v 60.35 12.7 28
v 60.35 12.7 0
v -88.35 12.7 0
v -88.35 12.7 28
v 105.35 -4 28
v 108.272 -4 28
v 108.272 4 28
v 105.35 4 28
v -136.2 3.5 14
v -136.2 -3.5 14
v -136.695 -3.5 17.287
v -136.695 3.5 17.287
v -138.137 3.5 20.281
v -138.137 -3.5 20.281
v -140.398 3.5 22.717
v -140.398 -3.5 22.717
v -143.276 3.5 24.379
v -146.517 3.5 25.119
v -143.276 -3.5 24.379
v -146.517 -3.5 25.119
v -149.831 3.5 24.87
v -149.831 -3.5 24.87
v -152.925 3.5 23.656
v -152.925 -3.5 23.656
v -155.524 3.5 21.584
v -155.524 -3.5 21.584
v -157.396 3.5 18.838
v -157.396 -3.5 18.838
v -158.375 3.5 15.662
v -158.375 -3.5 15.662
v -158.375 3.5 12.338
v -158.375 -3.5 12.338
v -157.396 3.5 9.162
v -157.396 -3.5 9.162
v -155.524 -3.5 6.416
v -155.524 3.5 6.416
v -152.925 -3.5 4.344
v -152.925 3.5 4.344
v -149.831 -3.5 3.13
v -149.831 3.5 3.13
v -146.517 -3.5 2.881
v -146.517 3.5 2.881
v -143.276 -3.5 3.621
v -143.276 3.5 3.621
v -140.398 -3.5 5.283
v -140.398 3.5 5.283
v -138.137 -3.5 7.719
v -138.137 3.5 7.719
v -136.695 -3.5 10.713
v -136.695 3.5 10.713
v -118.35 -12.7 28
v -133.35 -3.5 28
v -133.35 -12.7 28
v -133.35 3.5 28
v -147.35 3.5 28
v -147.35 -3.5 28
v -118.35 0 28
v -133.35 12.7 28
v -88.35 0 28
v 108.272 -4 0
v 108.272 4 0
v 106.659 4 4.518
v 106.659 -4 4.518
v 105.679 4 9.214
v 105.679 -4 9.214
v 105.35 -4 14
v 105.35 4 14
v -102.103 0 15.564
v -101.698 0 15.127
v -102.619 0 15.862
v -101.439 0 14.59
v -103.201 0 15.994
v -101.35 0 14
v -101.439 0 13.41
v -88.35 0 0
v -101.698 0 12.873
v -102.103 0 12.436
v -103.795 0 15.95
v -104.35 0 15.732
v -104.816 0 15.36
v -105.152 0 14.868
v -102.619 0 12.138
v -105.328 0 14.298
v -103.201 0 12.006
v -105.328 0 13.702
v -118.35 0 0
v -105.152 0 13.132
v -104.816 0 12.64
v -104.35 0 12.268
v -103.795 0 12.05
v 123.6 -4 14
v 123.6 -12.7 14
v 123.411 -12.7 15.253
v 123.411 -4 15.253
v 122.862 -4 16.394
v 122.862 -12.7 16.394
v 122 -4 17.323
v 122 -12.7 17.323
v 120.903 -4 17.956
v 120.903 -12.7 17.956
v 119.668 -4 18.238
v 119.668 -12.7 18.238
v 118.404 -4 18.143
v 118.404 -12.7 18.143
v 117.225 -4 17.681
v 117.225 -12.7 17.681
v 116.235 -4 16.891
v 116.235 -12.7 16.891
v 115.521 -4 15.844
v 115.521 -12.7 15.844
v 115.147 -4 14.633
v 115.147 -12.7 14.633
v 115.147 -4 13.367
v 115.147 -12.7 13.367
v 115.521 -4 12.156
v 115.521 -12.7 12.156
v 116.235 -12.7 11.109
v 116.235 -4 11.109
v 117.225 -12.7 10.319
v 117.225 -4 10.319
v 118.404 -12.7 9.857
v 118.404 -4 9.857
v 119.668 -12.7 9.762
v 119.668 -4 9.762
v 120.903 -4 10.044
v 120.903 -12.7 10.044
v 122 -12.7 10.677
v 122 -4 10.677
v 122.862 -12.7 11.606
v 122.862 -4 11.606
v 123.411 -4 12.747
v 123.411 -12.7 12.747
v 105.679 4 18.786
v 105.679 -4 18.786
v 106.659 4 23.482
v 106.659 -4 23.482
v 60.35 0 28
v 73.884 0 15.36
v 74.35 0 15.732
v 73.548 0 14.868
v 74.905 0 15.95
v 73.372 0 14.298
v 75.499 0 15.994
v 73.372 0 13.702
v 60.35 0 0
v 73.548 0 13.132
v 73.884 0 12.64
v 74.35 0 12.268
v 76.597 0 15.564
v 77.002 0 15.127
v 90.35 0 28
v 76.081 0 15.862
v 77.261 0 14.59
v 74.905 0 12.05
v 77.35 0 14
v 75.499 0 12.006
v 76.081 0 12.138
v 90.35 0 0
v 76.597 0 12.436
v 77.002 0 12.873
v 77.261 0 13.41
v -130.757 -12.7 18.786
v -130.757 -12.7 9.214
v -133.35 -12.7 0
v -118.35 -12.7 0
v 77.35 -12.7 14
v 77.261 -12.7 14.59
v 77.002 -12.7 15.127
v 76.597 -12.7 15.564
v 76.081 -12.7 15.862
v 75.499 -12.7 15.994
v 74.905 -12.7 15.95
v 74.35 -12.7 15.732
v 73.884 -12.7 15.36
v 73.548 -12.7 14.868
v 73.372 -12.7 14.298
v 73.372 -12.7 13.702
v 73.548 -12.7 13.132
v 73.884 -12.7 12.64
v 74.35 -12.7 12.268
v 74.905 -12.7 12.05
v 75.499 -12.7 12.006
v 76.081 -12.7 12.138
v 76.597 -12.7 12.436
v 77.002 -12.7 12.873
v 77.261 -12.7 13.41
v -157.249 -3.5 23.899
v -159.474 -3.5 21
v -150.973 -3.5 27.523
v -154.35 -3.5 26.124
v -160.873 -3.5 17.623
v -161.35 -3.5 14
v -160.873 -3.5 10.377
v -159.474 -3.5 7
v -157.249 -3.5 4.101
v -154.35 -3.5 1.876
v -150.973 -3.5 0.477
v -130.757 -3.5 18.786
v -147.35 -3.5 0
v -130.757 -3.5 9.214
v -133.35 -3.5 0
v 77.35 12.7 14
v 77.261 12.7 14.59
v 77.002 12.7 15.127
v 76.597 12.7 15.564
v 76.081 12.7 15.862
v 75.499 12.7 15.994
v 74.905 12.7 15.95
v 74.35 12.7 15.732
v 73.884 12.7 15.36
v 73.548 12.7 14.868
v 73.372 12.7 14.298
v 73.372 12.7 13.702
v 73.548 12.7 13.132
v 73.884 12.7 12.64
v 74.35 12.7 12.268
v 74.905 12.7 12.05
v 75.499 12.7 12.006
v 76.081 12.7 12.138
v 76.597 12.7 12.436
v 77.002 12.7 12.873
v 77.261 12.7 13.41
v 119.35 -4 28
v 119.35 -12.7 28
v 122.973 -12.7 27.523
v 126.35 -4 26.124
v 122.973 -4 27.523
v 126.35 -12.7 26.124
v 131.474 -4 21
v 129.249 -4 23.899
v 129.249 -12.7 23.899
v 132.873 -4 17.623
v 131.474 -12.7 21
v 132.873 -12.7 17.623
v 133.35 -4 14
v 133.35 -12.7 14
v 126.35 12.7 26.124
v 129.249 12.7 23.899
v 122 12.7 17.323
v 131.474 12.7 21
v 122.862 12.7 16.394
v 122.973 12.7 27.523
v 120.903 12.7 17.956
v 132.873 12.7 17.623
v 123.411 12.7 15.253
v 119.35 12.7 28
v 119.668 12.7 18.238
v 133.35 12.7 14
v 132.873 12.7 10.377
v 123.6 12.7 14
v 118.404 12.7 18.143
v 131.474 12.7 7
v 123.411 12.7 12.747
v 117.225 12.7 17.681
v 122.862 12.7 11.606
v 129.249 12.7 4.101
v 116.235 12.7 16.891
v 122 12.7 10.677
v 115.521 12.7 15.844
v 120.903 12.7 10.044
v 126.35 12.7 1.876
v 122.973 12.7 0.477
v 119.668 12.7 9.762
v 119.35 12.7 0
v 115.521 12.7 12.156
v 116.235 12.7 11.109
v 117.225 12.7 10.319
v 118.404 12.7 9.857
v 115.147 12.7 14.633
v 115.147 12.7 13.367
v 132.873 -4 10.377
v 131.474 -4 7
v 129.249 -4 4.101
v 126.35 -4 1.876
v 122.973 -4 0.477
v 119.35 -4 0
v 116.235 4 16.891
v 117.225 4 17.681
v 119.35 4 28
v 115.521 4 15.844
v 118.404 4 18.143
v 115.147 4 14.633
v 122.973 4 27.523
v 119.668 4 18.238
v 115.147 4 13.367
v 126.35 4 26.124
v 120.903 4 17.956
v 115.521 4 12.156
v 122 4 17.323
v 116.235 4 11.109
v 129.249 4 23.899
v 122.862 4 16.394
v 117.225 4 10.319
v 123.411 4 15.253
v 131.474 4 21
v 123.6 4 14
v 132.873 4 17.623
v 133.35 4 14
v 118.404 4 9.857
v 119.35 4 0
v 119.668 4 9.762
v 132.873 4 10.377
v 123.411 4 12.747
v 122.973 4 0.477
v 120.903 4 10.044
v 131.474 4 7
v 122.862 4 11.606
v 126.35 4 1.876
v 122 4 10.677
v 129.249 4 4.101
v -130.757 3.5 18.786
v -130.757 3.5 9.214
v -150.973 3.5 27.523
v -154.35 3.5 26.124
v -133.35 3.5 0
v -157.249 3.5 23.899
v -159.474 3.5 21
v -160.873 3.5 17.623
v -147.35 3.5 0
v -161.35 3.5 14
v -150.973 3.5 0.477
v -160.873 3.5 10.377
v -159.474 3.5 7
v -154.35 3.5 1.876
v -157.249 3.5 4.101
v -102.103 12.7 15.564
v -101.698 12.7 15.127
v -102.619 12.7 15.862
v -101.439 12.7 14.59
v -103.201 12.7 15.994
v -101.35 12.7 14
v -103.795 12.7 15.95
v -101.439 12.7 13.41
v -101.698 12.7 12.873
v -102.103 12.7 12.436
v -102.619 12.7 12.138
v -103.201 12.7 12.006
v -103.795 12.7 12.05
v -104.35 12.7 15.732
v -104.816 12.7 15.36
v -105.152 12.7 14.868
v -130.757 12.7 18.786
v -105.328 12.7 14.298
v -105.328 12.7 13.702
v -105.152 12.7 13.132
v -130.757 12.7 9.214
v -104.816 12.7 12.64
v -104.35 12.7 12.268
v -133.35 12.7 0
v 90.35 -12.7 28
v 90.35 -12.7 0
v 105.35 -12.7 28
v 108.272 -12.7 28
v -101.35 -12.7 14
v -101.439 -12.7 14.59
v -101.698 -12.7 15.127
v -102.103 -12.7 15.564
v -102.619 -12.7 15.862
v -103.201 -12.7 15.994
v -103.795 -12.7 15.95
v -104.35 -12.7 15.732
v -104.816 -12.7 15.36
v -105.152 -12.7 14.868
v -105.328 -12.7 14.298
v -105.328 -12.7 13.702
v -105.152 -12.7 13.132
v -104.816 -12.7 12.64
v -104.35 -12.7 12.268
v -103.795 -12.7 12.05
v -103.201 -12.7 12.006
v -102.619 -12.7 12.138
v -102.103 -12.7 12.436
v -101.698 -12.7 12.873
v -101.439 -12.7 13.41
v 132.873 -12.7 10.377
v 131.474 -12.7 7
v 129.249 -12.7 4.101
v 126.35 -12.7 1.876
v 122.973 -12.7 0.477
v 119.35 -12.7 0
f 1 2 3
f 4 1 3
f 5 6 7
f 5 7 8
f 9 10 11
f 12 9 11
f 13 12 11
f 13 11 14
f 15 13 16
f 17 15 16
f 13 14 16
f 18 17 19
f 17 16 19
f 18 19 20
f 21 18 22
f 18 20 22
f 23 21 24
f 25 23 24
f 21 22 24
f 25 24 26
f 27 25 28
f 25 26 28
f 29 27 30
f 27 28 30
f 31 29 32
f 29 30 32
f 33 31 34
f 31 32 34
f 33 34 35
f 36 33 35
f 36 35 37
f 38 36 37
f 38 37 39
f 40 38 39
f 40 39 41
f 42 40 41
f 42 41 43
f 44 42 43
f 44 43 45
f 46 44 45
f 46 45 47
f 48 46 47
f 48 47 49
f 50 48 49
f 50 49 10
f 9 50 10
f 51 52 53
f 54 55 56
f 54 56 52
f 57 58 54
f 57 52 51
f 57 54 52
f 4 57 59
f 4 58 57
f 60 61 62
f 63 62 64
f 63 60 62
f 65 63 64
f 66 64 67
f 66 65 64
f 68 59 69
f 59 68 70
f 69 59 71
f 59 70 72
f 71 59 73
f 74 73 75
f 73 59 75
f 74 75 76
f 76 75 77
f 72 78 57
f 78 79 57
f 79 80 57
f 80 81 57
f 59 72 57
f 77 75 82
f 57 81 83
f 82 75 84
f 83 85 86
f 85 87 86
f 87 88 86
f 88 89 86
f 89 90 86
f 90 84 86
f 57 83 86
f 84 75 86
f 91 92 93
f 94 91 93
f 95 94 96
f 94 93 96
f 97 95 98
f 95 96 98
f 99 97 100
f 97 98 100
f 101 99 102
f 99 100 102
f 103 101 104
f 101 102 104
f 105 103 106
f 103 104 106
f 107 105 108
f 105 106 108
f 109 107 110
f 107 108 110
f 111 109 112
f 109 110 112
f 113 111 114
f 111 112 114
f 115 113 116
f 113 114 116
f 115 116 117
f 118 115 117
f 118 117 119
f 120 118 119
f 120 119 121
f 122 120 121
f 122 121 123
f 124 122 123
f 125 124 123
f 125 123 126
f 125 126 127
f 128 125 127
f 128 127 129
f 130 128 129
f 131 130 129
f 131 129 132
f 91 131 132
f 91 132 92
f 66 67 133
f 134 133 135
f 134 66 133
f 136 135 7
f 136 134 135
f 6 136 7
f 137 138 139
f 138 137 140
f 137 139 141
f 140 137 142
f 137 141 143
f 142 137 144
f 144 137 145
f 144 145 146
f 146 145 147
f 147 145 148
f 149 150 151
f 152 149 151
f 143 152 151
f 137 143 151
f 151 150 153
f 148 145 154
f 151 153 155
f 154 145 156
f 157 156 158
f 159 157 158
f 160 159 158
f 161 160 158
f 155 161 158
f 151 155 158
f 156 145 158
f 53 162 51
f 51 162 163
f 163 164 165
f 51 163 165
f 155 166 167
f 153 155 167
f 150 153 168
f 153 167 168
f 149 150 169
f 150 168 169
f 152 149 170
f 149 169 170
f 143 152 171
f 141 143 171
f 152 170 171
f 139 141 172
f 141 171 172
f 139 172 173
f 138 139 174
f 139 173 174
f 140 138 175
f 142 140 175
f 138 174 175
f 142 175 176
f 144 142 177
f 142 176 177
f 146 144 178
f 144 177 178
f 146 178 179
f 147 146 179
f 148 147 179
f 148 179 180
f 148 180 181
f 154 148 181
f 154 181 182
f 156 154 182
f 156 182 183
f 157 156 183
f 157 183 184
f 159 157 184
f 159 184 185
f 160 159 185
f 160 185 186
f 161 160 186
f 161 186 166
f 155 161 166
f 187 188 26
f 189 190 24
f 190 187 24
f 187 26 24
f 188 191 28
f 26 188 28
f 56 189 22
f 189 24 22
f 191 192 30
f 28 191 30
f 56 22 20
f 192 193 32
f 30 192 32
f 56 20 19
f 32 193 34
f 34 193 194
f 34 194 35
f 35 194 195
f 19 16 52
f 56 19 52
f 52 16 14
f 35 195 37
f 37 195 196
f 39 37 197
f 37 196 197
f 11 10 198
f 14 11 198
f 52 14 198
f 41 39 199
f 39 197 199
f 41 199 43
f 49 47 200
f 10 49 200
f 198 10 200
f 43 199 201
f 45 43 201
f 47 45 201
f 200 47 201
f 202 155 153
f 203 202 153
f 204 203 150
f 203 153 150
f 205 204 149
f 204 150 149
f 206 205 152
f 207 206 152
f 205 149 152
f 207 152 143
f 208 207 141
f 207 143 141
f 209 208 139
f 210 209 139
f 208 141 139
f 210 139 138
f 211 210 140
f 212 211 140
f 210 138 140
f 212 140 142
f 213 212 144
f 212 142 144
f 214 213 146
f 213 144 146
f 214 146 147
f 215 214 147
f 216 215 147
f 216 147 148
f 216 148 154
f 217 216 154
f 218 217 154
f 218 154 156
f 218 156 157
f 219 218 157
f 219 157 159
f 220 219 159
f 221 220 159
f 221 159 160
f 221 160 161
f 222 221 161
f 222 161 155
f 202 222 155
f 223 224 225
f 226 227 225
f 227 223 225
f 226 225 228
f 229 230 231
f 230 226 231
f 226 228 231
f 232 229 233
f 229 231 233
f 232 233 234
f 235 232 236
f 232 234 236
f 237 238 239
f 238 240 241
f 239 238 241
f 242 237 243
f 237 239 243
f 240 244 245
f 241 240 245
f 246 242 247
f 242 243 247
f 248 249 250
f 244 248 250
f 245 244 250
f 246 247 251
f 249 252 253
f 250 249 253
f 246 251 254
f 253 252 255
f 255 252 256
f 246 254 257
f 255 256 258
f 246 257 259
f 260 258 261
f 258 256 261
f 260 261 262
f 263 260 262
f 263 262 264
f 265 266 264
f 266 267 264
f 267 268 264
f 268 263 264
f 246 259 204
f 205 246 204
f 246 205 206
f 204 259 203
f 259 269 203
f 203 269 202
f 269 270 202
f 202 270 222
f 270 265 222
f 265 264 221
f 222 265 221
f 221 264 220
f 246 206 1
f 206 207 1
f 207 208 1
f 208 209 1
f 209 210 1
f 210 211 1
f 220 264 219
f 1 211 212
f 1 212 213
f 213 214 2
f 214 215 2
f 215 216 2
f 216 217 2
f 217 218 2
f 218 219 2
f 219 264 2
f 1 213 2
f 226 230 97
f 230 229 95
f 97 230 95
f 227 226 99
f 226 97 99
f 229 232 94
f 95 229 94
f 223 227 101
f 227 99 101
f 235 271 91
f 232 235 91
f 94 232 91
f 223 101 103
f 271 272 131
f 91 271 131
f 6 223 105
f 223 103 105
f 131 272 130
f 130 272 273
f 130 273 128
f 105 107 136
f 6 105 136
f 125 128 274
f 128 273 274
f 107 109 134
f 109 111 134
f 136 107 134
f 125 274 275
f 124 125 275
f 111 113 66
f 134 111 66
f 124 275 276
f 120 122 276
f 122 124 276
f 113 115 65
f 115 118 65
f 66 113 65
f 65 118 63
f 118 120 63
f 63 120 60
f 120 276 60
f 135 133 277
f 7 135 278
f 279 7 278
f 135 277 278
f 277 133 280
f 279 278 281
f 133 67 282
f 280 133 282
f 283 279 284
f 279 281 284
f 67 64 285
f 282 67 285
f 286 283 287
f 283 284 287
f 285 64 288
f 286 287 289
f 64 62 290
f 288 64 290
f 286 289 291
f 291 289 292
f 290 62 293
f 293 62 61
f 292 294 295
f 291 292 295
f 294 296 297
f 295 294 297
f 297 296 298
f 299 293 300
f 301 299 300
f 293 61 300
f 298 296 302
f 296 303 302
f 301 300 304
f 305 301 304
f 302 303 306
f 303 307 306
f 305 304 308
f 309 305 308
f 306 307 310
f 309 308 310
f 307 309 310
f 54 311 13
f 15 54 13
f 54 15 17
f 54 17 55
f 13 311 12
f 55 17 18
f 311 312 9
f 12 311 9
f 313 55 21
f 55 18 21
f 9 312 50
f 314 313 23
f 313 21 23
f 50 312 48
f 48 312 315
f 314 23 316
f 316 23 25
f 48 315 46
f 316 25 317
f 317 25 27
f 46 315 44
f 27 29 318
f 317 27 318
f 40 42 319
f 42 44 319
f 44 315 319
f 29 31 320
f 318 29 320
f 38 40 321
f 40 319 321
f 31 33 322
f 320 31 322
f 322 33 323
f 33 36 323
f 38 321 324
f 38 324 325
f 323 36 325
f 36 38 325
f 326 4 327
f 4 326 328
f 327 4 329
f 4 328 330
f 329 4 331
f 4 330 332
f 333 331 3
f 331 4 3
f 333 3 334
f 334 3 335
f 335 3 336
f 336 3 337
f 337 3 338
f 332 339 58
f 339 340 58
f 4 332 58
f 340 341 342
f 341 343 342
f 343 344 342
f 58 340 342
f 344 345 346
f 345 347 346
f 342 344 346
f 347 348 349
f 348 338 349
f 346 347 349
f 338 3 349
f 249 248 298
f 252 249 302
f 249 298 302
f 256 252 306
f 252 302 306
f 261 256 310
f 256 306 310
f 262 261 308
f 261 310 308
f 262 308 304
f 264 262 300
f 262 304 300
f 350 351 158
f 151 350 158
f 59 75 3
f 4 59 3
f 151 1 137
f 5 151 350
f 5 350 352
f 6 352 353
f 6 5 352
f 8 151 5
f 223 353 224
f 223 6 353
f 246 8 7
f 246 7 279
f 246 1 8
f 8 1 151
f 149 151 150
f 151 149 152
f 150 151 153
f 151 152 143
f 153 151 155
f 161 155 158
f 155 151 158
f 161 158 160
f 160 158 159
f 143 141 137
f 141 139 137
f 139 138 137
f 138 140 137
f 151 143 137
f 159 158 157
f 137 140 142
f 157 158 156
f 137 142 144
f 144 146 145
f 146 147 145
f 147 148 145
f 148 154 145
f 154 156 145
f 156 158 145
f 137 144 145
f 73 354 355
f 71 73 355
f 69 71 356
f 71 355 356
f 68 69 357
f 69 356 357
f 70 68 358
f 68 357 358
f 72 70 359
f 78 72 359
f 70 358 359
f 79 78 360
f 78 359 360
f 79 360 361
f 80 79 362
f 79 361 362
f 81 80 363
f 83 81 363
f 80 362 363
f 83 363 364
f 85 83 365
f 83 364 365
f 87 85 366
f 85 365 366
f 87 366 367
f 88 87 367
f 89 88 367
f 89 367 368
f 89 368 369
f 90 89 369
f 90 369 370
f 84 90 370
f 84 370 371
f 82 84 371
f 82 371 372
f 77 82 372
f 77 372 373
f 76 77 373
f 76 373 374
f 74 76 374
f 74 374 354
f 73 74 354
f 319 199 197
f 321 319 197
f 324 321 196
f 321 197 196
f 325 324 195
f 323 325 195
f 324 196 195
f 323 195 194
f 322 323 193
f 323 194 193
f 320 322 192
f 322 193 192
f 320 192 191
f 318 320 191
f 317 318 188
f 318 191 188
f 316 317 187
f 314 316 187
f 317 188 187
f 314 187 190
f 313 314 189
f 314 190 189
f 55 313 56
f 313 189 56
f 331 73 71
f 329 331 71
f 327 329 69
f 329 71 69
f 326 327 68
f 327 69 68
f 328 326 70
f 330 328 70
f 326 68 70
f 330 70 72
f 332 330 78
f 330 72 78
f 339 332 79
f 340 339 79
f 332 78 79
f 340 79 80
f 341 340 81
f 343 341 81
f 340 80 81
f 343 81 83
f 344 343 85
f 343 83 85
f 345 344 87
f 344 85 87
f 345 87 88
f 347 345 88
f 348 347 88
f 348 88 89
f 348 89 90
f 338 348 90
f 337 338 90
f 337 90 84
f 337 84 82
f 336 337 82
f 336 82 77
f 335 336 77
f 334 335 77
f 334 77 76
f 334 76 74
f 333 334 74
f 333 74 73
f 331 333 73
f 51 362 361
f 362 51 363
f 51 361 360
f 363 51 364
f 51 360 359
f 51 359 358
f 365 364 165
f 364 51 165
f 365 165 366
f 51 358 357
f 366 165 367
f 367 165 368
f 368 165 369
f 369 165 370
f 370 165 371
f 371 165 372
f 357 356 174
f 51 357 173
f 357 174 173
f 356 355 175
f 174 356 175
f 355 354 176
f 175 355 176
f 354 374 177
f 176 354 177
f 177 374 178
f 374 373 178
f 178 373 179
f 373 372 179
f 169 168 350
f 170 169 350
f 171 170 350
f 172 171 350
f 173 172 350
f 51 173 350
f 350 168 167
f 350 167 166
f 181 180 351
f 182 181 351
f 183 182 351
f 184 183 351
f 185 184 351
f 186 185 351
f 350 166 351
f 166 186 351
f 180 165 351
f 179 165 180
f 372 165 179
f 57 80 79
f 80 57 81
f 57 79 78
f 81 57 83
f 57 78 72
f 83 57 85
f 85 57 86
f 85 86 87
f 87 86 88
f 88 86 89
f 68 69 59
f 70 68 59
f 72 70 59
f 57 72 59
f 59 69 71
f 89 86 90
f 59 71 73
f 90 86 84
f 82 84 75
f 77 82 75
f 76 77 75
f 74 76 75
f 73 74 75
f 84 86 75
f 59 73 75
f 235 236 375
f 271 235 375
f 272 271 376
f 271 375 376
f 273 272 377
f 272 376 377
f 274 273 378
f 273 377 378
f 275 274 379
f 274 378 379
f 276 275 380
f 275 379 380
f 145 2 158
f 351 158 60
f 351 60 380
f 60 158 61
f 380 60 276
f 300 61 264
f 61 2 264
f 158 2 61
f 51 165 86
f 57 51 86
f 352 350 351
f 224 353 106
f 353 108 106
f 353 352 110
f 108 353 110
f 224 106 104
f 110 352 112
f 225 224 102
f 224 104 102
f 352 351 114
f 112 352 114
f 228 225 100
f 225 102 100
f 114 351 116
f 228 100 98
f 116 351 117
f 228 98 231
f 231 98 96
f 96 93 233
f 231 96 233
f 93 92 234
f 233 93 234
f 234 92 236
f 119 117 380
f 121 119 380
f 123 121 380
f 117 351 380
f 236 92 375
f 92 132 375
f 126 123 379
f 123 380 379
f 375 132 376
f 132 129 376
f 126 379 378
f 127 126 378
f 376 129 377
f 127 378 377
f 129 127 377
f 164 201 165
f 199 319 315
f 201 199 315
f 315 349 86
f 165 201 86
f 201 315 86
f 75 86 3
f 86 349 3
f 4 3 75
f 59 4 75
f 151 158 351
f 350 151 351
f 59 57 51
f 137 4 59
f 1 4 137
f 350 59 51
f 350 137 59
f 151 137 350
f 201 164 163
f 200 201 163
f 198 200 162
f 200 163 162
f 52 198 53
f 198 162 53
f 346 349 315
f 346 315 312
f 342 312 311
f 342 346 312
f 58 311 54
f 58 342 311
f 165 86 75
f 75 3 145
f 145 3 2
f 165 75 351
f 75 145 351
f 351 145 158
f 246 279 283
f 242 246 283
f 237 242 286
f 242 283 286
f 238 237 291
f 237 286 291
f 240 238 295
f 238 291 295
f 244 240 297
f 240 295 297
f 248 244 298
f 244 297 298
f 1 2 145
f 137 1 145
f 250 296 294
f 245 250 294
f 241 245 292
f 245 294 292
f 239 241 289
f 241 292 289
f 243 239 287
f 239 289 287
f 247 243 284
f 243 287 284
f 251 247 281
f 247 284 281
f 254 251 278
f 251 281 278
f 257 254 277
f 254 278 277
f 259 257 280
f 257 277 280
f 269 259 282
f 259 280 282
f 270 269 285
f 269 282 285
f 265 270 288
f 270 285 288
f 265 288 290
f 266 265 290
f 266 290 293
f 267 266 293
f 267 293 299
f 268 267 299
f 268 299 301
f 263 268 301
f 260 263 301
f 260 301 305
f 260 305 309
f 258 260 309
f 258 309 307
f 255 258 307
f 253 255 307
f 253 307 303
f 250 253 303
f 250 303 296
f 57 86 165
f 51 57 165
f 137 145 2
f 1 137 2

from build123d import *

# Parameters (mm, degrees)
F2_DEPTH  = 28
F3_DEPTH  = 28
F4_DEPTH  = 28
F5_R      = 11.15
F6_DEPTH  = 16.2
F5_R_2    = 4.25
F7_DEPTH  = 25.4
F8_DEPTH  = 16.7
F9_DEPTH  = 9.2
F12_R     = 2
F13_DEPTH = 25.4


with BuildPart() as f2:
    # F1 (on Top) → F2 (new body)
    with BuildSketch(Plane.XY):
        Polygon((-88.35, 12.7), (-133.35, 12.7), (-133.35, 3.5), (-161.35, 3.5), (-161.35, -3.5), (-133.35, -3.5), (-133.35, -12.7), (-118.35, -12.7), (-118.35, 0), (-88.35, 0), align=None)
    extrude(amount=F2_DEPTH)

    # F5 (on face) → F6 (cut, through all)
    with BuildSketch(Plane.XZ.offset(12.7)):
        with Locations((-147.35, 14)):
            Circle(F5_R)
        with BuildLine():
            Line((-161.35, 28), (-161.35, 14))
            ThreePointArc((-161.35, 14), (-157.2494949366, 23.8994949366), (-147.35, 28))
            Line((-147.35, 28), (-161.35, 28))
        make_face()
        with BuildLine():
            Line((-161.35, 14), (-161.35, 0))
            Line((-161.35, 0), (-147.35, 0))
            ThreePointArc((-147.35, 0), (-157.2494949366, 4.1005050634), (-161.35, 14))
        make_face()
    extrude(amount=-F6_DEPTH, mode=Mode.SUBTRACT)

    # F10: F9 across plane


with BuildPart() as f3:
    # F1 (on Top) → F3 (new body, through all)
    with BuildSketch(Plane.XY):
        Polygon((60.35, 12.7), (-88.35, 12.7), (-88.35, 0), (-118.35, 0), (-118.35, -12.7), (90.35, -12.7), (90.35, 0), (60.35, 0), align=None)
    extrude(amount=F3_DEPTH)


with BuildPart() as f4:
    # F1 (on Top) → F4 (new body, through all)
    with BuildSketch(Plane.XY):
        Polygon((133.35, 12.7), (60.35, 12.7), (60.35, 0), (90.35, 0), (90.35, -12.7), (133.35, -12.7), (133.35, -4), (105.35, -4), (105.35, 4), (133.35, 4), align=None)
    extrude(amount=F4_DEPTH)

    # F5 (on face) → F7 (cut, through all)
    with BuildSketch(Plane.XZ.offset(12.7)):
        with Locations((119.35, 14)):
            Circle(F5_R_2)
        with BuildLine():
            Line((133.35, 28), (119.35, 28.0000000002))
            ThreePointArc((119.35, 28.0000000001), (129.2494949366, 23.8994949367), (133.35, 14.0000000001))
            Line((133.35, 14.0000000001), (133.35, 28))
        make_face()
        with BuildLine():
            ThreePointArc((133.35, 14.0000000001), (129.2494949366, 4.1005050634), (119.35, 0))
            Line((119.35, 0), (133.35, 0))
            Line((133.35, 1e-10), (133.35, 14.0000000001))
        make_face()
    extrude(amount=-F7_DEPTH, mode=Mode.SUBTRACT)

    # F5 (on face) → F8 (join, through all)
    with BuildSketch(Plane.XZ.offset(12.7)):
        with BuildLine():
            Line((105.35, 28.0000000004), (105.35, 14.0000000001))
            ThreePointArc((105.35, 14.0000000001), (106.0882790475, 21.1508375293), (108.2719701354, 28.0000000003))
            Line((108.2719701354, 28.0000000003), (105.35, 28.0000000004))
        make_face()
        with BuildLine():
            Line((105.35, 14.0000000001), (105.35, 2e-10))
            Line((105.35, 0), (108.2719701353, 0))
            ThreePointArc((108.2719701353, 0), (106.0882790474, 6.8491624709), (105.35, 14.0000000001))
        make_face()
    extrude(amount=-F8_DEPTH)


with BuildPart() as f9:
    # F5 (on face) → F9 (new body, through all)
    with BuildSketch(Plane.XZ.offset(12.7)):
        with BuildLine():
            Line((-133.35, 28), (-133.35, 0))
            ThreePointArc((-133.35, 0), (-130.4280298647, 14), (-133.35, 28))
        make_face()
    extrude(amount=-F9_DEPTH)


with BuildPart() as f2_1:
    add(f2.part)
    add(f9.part.mirror(Plane.XZ), mode=Mode.SUBTRACT)

    # F11: cut F9
    add(f9.part, mode=Mode.SUBTRACT)


with BuildPart() as f13_tool:
    # F12 (on face) → F13 (new body, through all)
    with BuildSketch(Plane.XZ.offset(12.7)):
        with Locations((-103.35, 14)):
            Circle(F12_R)
        with Locations((75.35, 14.0000000006)):
            Circle(F12_R)
    extrude(amount=-F13_DEPTH)


with BuildPart() as f2_2:
    add(f2_1.part)

    # F13: cut by f13_tool
    add(f13_tool.part, mode=Mode.SUBTRACT)


with BuildPart() as f3_1:
    add(f3.part)

    # F13: cut by f13_tool
    add(f13_tool.part, mode=Mode.SUBTRACT)


with BuildPart() as f4_1:
    add(f4.part)

    # F13: cut by f13_tool
    add(f13_tool.part, mode=Mode.SUBTRACT)


solid = Compound([f2_2.part, f3_1.part, f4_1.part])
